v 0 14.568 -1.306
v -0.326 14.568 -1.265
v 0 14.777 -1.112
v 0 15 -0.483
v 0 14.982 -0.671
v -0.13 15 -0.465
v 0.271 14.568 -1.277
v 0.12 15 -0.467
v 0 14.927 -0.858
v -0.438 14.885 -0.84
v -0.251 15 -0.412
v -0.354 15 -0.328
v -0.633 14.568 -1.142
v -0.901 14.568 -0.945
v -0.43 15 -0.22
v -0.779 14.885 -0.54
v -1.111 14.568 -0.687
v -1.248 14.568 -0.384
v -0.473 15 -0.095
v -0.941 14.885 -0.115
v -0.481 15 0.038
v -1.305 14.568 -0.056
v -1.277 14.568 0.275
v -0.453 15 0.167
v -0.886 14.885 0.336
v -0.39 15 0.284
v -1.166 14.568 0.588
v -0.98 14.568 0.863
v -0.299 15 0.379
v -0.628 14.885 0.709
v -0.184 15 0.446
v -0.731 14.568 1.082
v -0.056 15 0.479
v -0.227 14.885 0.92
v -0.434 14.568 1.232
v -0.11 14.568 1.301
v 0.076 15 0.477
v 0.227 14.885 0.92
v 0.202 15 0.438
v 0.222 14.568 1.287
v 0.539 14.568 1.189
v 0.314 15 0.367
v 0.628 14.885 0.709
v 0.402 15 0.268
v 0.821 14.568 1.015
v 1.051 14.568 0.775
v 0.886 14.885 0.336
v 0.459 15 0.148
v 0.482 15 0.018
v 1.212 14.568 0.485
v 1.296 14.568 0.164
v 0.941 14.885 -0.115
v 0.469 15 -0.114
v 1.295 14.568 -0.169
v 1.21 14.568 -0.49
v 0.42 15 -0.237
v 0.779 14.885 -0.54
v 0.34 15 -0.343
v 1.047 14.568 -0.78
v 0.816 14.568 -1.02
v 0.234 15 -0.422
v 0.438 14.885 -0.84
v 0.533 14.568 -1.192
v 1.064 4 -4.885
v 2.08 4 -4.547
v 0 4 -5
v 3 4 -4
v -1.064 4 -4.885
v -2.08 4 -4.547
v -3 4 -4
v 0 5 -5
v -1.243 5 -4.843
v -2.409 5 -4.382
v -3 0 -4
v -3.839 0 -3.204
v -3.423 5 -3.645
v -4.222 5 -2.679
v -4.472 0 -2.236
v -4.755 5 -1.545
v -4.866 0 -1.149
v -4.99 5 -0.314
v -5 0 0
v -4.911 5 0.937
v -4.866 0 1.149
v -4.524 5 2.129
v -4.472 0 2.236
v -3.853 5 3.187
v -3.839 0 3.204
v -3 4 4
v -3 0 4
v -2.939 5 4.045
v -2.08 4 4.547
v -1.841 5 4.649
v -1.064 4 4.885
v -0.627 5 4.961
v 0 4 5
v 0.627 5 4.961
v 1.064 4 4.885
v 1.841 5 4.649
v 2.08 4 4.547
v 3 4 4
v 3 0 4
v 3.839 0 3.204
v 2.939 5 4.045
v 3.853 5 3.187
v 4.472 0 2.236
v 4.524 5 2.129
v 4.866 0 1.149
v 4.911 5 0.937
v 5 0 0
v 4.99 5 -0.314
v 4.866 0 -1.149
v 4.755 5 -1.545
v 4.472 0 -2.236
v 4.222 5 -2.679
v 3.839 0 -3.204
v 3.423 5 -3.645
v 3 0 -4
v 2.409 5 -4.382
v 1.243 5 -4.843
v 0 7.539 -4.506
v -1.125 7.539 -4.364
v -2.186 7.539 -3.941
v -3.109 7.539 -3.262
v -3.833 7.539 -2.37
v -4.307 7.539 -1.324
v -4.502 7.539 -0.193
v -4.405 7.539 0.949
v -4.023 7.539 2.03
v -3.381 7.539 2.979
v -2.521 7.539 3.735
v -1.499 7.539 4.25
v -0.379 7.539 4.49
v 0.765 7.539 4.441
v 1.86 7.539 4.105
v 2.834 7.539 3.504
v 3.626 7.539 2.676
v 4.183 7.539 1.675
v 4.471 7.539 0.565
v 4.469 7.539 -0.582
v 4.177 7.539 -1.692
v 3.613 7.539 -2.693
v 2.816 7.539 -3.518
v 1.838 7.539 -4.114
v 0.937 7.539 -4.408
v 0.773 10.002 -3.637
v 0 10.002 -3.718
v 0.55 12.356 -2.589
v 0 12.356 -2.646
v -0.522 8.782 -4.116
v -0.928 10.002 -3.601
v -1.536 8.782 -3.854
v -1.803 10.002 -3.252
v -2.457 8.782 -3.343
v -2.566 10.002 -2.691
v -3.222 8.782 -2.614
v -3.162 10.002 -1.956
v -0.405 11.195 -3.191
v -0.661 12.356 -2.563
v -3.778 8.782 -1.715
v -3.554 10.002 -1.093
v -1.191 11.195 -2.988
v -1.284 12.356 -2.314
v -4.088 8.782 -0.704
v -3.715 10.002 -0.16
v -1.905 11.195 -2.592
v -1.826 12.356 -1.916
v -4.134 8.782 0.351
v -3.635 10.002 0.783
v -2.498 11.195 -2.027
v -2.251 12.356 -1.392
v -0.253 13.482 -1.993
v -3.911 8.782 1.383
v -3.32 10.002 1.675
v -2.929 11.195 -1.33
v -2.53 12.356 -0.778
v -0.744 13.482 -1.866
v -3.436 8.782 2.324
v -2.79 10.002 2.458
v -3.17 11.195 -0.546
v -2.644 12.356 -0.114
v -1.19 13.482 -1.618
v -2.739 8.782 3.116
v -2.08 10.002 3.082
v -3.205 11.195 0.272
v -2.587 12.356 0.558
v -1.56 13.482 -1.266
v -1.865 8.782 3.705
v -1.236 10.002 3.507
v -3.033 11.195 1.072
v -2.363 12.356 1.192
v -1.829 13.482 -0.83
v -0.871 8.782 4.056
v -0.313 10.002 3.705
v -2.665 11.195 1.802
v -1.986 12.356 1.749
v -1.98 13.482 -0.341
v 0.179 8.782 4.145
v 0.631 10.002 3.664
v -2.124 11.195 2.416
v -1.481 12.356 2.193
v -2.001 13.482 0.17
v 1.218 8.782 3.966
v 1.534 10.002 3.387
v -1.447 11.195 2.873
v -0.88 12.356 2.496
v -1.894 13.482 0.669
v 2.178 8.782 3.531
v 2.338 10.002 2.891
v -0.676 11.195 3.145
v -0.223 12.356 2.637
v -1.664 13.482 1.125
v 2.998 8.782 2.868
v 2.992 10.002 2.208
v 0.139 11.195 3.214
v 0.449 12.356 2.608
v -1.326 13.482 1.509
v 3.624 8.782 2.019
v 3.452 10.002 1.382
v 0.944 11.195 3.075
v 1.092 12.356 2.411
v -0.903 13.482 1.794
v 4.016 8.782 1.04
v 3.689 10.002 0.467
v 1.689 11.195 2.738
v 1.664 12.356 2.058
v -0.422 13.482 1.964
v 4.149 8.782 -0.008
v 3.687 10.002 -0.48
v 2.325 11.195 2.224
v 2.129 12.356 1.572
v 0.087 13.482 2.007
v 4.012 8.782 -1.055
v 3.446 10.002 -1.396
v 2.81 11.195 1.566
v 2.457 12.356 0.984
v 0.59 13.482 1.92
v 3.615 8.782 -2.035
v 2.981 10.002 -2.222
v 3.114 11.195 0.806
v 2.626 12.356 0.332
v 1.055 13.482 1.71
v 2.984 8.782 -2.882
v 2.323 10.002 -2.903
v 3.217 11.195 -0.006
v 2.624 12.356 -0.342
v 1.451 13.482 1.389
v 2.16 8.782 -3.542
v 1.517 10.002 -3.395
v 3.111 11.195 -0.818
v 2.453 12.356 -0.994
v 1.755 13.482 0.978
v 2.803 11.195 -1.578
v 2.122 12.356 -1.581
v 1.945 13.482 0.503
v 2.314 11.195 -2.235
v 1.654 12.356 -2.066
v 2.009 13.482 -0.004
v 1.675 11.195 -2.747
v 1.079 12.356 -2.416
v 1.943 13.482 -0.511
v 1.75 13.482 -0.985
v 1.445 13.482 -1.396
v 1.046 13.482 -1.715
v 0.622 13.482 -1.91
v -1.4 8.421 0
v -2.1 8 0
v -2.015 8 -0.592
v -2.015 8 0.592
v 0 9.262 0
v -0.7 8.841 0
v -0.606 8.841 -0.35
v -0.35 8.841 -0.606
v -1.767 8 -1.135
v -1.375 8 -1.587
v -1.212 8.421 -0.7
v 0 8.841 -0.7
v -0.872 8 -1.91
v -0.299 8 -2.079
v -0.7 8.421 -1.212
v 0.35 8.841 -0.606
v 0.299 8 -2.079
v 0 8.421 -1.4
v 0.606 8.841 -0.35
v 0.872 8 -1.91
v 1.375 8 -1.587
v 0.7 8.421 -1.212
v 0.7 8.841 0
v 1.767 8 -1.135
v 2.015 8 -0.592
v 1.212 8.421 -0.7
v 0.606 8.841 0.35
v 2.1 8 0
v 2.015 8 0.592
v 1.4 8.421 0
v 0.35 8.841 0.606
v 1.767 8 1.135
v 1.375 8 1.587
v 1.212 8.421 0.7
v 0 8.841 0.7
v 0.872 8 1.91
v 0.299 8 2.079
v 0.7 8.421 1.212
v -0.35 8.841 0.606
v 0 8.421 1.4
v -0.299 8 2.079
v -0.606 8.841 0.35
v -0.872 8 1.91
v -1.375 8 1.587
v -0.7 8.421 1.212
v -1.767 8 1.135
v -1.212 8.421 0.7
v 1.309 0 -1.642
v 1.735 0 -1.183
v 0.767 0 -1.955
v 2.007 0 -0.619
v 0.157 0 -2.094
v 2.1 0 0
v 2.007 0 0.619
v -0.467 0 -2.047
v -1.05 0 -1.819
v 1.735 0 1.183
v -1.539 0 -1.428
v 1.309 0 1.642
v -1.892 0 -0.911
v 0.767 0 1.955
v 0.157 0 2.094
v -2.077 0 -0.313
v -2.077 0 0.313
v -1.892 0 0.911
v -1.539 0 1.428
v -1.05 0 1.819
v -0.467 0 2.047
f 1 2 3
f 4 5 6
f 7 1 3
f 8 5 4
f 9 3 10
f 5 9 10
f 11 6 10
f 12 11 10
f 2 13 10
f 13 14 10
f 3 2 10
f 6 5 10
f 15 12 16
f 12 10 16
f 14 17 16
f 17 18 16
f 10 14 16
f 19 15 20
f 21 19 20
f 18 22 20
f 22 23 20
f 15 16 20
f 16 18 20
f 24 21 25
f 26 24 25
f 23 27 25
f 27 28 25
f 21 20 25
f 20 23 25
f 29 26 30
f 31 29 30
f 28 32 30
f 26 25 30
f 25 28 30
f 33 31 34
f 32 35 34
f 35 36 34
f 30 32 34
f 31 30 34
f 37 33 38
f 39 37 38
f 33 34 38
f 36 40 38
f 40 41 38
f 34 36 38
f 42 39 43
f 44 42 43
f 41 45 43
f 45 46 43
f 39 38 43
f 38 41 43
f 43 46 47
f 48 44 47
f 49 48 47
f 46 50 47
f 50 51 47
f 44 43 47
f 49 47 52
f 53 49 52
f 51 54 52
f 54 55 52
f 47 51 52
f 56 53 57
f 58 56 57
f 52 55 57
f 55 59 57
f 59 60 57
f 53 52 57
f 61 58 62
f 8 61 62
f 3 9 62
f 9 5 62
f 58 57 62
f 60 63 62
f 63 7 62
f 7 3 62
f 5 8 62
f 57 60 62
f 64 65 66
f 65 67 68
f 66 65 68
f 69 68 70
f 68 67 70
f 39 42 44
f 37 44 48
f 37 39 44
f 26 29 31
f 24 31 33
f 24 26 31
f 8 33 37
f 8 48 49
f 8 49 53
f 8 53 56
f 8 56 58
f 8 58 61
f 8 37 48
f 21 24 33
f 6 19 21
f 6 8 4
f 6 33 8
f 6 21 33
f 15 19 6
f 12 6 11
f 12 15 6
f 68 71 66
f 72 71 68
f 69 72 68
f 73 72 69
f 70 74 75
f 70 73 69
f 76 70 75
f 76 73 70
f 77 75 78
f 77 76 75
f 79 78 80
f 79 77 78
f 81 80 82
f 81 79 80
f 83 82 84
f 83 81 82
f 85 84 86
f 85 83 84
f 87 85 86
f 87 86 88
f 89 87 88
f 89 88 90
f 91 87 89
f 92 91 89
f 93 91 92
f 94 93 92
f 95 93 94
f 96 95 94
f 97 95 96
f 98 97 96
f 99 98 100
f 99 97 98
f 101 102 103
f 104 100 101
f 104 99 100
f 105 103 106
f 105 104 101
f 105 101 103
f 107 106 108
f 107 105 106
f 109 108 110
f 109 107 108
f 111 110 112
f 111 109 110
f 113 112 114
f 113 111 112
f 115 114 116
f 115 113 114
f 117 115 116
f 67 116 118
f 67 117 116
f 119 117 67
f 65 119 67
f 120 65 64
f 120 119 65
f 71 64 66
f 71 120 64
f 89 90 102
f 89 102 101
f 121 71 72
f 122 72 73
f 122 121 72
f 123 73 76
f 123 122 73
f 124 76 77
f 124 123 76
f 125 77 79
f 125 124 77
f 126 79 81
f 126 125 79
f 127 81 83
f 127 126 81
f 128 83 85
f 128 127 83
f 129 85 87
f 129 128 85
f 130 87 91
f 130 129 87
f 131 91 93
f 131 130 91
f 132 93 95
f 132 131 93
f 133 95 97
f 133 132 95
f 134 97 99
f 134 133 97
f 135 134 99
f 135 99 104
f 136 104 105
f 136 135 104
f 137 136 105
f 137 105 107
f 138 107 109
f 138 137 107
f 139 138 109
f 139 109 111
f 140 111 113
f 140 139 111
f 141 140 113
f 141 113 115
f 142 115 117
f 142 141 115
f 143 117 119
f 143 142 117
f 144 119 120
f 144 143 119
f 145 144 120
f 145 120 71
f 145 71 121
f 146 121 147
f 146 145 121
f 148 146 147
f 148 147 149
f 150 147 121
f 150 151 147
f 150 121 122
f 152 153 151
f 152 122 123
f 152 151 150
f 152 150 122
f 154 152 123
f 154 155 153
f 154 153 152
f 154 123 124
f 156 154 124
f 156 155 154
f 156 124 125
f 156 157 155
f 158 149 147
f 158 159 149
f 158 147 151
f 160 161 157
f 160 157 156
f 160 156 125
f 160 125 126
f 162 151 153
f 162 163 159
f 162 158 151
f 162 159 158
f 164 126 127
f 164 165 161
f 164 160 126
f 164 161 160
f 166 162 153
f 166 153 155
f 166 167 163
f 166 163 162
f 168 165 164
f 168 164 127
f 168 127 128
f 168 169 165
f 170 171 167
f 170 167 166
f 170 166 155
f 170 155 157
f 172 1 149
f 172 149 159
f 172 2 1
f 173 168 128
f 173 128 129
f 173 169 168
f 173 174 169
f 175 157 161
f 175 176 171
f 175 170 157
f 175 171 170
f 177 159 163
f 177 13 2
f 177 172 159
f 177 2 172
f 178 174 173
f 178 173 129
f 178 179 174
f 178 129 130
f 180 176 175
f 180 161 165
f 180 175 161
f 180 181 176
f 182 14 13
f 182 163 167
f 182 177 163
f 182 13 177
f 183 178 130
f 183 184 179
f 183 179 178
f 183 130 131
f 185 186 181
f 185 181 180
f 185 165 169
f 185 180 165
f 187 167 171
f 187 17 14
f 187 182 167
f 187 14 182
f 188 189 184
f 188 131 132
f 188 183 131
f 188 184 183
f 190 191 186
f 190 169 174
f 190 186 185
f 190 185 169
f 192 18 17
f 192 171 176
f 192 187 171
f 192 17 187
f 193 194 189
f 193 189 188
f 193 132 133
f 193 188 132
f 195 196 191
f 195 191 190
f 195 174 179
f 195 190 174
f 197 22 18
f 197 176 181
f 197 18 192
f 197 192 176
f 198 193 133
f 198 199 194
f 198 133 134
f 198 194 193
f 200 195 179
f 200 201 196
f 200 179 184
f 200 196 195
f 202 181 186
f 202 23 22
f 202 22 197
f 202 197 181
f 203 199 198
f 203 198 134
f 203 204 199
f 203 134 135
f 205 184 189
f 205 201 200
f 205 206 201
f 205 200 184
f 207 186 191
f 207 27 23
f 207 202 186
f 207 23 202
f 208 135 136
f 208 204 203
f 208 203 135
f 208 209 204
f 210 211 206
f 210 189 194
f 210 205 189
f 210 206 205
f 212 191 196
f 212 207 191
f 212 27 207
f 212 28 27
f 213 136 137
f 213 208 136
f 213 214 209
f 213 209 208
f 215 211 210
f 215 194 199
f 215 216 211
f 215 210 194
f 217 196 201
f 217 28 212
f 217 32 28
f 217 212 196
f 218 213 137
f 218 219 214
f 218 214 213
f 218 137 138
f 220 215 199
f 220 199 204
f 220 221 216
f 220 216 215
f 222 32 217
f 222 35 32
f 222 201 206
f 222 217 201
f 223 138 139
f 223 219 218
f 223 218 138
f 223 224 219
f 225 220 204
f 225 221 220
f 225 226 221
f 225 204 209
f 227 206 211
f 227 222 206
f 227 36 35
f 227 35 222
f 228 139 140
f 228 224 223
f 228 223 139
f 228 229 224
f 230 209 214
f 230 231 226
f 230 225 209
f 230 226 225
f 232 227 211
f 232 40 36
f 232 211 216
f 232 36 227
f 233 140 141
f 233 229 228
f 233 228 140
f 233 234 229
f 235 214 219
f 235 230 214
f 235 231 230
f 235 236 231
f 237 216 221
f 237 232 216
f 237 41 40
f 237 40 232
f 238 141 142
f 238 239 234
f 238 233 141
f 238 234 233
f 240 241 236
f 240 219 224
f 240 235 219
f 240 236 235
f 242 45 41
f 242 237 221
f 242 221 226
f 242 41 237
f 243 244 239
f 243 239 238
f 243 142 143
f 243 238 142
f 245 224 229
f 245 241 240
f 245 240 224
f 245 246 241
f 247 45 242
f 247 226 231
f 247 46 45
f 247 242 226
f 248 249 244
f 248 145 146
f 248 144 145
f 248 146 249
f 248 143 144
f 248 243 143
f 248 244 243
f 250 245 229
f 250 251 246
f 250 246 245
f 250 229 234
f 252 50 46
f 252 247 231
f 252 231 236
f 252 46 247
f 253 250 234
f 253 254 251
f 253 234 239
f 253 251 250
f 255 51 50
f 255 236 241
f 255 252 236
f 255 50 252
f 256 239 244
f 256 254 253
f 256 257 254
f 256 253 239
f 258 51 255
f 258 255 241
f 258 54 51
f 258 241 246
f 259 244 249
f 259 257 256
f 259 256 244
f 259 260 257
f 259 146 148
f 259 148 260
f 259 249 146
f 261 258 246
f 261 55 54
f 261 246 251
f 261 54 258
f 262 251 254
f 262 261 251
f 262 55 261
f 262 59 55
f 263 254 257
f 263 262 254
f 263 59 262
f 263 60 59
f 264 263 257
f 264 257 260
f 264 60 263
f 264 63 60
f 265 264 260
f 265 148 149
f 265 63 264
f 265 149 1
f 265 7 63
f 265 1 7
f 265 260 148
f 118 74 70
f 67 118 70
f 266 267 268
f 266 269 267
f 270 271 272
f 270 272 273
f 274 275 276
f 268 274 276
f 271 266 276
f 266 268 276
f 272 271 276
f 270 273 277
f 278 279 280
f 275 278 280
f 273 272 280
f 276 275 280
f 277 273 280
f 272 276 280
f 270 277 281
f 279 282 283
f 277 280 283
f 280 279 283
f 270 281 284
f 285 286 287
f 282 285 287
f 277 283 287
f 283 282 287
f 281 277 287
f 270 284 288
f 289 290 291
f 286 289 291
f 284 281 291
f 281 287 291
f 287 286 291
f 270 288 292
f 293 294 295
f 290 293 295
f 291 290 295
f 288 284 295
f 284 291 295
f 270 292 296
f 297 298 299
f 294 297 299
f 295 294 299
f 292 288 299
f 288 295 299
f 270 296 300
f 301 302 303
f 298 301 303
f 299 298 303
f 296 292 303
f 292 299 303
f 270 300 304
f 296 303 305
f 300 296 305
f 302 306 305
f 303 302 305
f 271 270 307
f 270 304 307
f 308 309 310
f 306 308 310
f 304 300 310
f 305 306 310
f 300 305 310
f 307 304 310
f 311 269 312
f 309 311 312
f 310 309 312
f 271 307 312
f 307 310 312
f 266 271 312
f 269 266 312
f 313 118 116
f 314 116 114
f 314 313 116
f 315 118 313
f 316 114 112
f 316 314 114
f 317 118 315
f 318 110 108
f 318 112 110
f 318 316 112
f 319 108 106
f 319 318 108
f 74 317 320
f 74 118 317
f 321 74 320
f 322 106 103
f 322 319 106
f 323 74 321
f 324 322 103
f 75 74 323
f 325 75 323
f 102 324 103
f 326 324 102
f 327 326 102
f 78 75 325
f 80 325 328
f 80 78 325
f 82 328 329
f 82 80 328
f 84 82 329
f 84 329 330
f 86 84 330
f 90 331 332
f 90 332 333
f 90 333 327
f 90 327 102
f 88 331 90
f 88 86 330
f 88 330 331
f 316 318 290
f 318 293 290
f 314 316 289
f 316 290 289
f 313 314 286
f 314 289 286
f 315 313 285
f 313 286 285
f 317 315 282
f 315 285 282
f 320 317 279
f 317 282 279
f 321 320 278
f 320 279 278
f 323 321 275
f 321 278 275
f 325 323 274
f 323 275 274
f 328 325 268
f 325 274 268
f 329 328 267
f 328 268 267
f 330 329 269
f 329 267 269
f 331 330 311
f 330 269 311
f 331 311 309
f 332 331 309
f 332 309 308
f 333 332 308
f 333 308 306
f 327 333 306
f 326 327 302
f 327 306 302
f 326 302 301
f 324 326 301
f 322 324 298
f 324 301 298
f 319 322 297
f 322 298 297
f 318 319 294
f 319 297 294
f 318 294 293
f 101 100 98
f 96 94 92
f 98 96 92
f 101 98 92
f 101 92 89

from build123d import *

# Parameters (mm, degrees)
FILLET2_R                 = 1
CUT_EXTRUDE1_DEPTH        = 17.583124103
CUT_EXTRUDE1_DEPTH_BACK   = 17.583124103
SKETCH4_W                 = 3
SKETCH4_H                 = 4
M5X0_8_TAPPED_HOLE1_D     = 4.2
M5X0_8_TAPPED_HOLE1_DEPTH = 8
M5X0_8_TAPPED_HOLE1_TIP   = 1.2618073


with BuildPart() as part:
    # Sketch1 → Revolve2 (revolve)
    with BuildSketch(Plane.XY, mode=Mode.PRIVATE) as revolve2_sk:
        with BuildLine():
            Line((0, 0), (-5, 0))
            Line((-5, 0), (-5, 5))
            ThreePointArc((-5, 5), (-3.621402516, 10.248561006), (-1, 15))
            Line((-1, 15), (0, 15))
            Line((0, 15), (0, 0))
        make_face()
    revolve(revolve2_sk.sketch.rotate(Axis((0, 0, 0), (0, 1, 0)), 270), axis=Axis((0, 0, 0), (0, 1, 0)))

    # Fillet2
    fillet2_edges = [part.edges().sort_by_distance(p)[0] for p in [
        (0, 15, 1),
    ]]
    fillet(fillet2_edges, radius=FILLET2_R)

    # Sketch4 → Cut-Extrude1 (cut, two sides: drawn at the far end of the back side and taken through both)
    with BuildSketch(Plane(origin=(0, 0, 0), x_dir=(0, 0, -1), z_dir=(1, 0, 0)).offset(-CUT_EXTRUDE1_DEPTH_BACK)):
        with Locations((-5.5, 2)):
            Rectangle(SKETCH4_W, SKETCH4_H)
        with Locations((5.5, 2)):
            Rectangle(SKETCH4_W, SKETCH4_H)
    extrude(amount=CUT_EXTRUDE1_DEPTH + CUT_EXTRUDE1_DEPTH_BACK, mode=Mode.SUBTRACT)

    # M5x0.8 Tapped Hole1
    with Locations(Plane(origin=(0, 0, 0), x_dir=(-1, 0, 0), z_dir=(0, -1, 0))):
        with Locations((0, 0)):
            Hole(M5X0_8_TAPPED_HOLE1_D / 2, depth=M5X0_8_TAPPED_HOLE1_DEPTH)
            with Locations((0, 0, -(M5X0_8_TAPPED_HOLE1_DEPTH + M5X0_8_TAPPED_HOLE1_TIP / 2))):  # 118° drill point
                Cone(0, M5X0_8_TAPPED_HOLE1_D / 2, M5X0_8_TAPPED_HOLE1_TIP, mode=Mode.SUBTRACT)


solid = part.part
